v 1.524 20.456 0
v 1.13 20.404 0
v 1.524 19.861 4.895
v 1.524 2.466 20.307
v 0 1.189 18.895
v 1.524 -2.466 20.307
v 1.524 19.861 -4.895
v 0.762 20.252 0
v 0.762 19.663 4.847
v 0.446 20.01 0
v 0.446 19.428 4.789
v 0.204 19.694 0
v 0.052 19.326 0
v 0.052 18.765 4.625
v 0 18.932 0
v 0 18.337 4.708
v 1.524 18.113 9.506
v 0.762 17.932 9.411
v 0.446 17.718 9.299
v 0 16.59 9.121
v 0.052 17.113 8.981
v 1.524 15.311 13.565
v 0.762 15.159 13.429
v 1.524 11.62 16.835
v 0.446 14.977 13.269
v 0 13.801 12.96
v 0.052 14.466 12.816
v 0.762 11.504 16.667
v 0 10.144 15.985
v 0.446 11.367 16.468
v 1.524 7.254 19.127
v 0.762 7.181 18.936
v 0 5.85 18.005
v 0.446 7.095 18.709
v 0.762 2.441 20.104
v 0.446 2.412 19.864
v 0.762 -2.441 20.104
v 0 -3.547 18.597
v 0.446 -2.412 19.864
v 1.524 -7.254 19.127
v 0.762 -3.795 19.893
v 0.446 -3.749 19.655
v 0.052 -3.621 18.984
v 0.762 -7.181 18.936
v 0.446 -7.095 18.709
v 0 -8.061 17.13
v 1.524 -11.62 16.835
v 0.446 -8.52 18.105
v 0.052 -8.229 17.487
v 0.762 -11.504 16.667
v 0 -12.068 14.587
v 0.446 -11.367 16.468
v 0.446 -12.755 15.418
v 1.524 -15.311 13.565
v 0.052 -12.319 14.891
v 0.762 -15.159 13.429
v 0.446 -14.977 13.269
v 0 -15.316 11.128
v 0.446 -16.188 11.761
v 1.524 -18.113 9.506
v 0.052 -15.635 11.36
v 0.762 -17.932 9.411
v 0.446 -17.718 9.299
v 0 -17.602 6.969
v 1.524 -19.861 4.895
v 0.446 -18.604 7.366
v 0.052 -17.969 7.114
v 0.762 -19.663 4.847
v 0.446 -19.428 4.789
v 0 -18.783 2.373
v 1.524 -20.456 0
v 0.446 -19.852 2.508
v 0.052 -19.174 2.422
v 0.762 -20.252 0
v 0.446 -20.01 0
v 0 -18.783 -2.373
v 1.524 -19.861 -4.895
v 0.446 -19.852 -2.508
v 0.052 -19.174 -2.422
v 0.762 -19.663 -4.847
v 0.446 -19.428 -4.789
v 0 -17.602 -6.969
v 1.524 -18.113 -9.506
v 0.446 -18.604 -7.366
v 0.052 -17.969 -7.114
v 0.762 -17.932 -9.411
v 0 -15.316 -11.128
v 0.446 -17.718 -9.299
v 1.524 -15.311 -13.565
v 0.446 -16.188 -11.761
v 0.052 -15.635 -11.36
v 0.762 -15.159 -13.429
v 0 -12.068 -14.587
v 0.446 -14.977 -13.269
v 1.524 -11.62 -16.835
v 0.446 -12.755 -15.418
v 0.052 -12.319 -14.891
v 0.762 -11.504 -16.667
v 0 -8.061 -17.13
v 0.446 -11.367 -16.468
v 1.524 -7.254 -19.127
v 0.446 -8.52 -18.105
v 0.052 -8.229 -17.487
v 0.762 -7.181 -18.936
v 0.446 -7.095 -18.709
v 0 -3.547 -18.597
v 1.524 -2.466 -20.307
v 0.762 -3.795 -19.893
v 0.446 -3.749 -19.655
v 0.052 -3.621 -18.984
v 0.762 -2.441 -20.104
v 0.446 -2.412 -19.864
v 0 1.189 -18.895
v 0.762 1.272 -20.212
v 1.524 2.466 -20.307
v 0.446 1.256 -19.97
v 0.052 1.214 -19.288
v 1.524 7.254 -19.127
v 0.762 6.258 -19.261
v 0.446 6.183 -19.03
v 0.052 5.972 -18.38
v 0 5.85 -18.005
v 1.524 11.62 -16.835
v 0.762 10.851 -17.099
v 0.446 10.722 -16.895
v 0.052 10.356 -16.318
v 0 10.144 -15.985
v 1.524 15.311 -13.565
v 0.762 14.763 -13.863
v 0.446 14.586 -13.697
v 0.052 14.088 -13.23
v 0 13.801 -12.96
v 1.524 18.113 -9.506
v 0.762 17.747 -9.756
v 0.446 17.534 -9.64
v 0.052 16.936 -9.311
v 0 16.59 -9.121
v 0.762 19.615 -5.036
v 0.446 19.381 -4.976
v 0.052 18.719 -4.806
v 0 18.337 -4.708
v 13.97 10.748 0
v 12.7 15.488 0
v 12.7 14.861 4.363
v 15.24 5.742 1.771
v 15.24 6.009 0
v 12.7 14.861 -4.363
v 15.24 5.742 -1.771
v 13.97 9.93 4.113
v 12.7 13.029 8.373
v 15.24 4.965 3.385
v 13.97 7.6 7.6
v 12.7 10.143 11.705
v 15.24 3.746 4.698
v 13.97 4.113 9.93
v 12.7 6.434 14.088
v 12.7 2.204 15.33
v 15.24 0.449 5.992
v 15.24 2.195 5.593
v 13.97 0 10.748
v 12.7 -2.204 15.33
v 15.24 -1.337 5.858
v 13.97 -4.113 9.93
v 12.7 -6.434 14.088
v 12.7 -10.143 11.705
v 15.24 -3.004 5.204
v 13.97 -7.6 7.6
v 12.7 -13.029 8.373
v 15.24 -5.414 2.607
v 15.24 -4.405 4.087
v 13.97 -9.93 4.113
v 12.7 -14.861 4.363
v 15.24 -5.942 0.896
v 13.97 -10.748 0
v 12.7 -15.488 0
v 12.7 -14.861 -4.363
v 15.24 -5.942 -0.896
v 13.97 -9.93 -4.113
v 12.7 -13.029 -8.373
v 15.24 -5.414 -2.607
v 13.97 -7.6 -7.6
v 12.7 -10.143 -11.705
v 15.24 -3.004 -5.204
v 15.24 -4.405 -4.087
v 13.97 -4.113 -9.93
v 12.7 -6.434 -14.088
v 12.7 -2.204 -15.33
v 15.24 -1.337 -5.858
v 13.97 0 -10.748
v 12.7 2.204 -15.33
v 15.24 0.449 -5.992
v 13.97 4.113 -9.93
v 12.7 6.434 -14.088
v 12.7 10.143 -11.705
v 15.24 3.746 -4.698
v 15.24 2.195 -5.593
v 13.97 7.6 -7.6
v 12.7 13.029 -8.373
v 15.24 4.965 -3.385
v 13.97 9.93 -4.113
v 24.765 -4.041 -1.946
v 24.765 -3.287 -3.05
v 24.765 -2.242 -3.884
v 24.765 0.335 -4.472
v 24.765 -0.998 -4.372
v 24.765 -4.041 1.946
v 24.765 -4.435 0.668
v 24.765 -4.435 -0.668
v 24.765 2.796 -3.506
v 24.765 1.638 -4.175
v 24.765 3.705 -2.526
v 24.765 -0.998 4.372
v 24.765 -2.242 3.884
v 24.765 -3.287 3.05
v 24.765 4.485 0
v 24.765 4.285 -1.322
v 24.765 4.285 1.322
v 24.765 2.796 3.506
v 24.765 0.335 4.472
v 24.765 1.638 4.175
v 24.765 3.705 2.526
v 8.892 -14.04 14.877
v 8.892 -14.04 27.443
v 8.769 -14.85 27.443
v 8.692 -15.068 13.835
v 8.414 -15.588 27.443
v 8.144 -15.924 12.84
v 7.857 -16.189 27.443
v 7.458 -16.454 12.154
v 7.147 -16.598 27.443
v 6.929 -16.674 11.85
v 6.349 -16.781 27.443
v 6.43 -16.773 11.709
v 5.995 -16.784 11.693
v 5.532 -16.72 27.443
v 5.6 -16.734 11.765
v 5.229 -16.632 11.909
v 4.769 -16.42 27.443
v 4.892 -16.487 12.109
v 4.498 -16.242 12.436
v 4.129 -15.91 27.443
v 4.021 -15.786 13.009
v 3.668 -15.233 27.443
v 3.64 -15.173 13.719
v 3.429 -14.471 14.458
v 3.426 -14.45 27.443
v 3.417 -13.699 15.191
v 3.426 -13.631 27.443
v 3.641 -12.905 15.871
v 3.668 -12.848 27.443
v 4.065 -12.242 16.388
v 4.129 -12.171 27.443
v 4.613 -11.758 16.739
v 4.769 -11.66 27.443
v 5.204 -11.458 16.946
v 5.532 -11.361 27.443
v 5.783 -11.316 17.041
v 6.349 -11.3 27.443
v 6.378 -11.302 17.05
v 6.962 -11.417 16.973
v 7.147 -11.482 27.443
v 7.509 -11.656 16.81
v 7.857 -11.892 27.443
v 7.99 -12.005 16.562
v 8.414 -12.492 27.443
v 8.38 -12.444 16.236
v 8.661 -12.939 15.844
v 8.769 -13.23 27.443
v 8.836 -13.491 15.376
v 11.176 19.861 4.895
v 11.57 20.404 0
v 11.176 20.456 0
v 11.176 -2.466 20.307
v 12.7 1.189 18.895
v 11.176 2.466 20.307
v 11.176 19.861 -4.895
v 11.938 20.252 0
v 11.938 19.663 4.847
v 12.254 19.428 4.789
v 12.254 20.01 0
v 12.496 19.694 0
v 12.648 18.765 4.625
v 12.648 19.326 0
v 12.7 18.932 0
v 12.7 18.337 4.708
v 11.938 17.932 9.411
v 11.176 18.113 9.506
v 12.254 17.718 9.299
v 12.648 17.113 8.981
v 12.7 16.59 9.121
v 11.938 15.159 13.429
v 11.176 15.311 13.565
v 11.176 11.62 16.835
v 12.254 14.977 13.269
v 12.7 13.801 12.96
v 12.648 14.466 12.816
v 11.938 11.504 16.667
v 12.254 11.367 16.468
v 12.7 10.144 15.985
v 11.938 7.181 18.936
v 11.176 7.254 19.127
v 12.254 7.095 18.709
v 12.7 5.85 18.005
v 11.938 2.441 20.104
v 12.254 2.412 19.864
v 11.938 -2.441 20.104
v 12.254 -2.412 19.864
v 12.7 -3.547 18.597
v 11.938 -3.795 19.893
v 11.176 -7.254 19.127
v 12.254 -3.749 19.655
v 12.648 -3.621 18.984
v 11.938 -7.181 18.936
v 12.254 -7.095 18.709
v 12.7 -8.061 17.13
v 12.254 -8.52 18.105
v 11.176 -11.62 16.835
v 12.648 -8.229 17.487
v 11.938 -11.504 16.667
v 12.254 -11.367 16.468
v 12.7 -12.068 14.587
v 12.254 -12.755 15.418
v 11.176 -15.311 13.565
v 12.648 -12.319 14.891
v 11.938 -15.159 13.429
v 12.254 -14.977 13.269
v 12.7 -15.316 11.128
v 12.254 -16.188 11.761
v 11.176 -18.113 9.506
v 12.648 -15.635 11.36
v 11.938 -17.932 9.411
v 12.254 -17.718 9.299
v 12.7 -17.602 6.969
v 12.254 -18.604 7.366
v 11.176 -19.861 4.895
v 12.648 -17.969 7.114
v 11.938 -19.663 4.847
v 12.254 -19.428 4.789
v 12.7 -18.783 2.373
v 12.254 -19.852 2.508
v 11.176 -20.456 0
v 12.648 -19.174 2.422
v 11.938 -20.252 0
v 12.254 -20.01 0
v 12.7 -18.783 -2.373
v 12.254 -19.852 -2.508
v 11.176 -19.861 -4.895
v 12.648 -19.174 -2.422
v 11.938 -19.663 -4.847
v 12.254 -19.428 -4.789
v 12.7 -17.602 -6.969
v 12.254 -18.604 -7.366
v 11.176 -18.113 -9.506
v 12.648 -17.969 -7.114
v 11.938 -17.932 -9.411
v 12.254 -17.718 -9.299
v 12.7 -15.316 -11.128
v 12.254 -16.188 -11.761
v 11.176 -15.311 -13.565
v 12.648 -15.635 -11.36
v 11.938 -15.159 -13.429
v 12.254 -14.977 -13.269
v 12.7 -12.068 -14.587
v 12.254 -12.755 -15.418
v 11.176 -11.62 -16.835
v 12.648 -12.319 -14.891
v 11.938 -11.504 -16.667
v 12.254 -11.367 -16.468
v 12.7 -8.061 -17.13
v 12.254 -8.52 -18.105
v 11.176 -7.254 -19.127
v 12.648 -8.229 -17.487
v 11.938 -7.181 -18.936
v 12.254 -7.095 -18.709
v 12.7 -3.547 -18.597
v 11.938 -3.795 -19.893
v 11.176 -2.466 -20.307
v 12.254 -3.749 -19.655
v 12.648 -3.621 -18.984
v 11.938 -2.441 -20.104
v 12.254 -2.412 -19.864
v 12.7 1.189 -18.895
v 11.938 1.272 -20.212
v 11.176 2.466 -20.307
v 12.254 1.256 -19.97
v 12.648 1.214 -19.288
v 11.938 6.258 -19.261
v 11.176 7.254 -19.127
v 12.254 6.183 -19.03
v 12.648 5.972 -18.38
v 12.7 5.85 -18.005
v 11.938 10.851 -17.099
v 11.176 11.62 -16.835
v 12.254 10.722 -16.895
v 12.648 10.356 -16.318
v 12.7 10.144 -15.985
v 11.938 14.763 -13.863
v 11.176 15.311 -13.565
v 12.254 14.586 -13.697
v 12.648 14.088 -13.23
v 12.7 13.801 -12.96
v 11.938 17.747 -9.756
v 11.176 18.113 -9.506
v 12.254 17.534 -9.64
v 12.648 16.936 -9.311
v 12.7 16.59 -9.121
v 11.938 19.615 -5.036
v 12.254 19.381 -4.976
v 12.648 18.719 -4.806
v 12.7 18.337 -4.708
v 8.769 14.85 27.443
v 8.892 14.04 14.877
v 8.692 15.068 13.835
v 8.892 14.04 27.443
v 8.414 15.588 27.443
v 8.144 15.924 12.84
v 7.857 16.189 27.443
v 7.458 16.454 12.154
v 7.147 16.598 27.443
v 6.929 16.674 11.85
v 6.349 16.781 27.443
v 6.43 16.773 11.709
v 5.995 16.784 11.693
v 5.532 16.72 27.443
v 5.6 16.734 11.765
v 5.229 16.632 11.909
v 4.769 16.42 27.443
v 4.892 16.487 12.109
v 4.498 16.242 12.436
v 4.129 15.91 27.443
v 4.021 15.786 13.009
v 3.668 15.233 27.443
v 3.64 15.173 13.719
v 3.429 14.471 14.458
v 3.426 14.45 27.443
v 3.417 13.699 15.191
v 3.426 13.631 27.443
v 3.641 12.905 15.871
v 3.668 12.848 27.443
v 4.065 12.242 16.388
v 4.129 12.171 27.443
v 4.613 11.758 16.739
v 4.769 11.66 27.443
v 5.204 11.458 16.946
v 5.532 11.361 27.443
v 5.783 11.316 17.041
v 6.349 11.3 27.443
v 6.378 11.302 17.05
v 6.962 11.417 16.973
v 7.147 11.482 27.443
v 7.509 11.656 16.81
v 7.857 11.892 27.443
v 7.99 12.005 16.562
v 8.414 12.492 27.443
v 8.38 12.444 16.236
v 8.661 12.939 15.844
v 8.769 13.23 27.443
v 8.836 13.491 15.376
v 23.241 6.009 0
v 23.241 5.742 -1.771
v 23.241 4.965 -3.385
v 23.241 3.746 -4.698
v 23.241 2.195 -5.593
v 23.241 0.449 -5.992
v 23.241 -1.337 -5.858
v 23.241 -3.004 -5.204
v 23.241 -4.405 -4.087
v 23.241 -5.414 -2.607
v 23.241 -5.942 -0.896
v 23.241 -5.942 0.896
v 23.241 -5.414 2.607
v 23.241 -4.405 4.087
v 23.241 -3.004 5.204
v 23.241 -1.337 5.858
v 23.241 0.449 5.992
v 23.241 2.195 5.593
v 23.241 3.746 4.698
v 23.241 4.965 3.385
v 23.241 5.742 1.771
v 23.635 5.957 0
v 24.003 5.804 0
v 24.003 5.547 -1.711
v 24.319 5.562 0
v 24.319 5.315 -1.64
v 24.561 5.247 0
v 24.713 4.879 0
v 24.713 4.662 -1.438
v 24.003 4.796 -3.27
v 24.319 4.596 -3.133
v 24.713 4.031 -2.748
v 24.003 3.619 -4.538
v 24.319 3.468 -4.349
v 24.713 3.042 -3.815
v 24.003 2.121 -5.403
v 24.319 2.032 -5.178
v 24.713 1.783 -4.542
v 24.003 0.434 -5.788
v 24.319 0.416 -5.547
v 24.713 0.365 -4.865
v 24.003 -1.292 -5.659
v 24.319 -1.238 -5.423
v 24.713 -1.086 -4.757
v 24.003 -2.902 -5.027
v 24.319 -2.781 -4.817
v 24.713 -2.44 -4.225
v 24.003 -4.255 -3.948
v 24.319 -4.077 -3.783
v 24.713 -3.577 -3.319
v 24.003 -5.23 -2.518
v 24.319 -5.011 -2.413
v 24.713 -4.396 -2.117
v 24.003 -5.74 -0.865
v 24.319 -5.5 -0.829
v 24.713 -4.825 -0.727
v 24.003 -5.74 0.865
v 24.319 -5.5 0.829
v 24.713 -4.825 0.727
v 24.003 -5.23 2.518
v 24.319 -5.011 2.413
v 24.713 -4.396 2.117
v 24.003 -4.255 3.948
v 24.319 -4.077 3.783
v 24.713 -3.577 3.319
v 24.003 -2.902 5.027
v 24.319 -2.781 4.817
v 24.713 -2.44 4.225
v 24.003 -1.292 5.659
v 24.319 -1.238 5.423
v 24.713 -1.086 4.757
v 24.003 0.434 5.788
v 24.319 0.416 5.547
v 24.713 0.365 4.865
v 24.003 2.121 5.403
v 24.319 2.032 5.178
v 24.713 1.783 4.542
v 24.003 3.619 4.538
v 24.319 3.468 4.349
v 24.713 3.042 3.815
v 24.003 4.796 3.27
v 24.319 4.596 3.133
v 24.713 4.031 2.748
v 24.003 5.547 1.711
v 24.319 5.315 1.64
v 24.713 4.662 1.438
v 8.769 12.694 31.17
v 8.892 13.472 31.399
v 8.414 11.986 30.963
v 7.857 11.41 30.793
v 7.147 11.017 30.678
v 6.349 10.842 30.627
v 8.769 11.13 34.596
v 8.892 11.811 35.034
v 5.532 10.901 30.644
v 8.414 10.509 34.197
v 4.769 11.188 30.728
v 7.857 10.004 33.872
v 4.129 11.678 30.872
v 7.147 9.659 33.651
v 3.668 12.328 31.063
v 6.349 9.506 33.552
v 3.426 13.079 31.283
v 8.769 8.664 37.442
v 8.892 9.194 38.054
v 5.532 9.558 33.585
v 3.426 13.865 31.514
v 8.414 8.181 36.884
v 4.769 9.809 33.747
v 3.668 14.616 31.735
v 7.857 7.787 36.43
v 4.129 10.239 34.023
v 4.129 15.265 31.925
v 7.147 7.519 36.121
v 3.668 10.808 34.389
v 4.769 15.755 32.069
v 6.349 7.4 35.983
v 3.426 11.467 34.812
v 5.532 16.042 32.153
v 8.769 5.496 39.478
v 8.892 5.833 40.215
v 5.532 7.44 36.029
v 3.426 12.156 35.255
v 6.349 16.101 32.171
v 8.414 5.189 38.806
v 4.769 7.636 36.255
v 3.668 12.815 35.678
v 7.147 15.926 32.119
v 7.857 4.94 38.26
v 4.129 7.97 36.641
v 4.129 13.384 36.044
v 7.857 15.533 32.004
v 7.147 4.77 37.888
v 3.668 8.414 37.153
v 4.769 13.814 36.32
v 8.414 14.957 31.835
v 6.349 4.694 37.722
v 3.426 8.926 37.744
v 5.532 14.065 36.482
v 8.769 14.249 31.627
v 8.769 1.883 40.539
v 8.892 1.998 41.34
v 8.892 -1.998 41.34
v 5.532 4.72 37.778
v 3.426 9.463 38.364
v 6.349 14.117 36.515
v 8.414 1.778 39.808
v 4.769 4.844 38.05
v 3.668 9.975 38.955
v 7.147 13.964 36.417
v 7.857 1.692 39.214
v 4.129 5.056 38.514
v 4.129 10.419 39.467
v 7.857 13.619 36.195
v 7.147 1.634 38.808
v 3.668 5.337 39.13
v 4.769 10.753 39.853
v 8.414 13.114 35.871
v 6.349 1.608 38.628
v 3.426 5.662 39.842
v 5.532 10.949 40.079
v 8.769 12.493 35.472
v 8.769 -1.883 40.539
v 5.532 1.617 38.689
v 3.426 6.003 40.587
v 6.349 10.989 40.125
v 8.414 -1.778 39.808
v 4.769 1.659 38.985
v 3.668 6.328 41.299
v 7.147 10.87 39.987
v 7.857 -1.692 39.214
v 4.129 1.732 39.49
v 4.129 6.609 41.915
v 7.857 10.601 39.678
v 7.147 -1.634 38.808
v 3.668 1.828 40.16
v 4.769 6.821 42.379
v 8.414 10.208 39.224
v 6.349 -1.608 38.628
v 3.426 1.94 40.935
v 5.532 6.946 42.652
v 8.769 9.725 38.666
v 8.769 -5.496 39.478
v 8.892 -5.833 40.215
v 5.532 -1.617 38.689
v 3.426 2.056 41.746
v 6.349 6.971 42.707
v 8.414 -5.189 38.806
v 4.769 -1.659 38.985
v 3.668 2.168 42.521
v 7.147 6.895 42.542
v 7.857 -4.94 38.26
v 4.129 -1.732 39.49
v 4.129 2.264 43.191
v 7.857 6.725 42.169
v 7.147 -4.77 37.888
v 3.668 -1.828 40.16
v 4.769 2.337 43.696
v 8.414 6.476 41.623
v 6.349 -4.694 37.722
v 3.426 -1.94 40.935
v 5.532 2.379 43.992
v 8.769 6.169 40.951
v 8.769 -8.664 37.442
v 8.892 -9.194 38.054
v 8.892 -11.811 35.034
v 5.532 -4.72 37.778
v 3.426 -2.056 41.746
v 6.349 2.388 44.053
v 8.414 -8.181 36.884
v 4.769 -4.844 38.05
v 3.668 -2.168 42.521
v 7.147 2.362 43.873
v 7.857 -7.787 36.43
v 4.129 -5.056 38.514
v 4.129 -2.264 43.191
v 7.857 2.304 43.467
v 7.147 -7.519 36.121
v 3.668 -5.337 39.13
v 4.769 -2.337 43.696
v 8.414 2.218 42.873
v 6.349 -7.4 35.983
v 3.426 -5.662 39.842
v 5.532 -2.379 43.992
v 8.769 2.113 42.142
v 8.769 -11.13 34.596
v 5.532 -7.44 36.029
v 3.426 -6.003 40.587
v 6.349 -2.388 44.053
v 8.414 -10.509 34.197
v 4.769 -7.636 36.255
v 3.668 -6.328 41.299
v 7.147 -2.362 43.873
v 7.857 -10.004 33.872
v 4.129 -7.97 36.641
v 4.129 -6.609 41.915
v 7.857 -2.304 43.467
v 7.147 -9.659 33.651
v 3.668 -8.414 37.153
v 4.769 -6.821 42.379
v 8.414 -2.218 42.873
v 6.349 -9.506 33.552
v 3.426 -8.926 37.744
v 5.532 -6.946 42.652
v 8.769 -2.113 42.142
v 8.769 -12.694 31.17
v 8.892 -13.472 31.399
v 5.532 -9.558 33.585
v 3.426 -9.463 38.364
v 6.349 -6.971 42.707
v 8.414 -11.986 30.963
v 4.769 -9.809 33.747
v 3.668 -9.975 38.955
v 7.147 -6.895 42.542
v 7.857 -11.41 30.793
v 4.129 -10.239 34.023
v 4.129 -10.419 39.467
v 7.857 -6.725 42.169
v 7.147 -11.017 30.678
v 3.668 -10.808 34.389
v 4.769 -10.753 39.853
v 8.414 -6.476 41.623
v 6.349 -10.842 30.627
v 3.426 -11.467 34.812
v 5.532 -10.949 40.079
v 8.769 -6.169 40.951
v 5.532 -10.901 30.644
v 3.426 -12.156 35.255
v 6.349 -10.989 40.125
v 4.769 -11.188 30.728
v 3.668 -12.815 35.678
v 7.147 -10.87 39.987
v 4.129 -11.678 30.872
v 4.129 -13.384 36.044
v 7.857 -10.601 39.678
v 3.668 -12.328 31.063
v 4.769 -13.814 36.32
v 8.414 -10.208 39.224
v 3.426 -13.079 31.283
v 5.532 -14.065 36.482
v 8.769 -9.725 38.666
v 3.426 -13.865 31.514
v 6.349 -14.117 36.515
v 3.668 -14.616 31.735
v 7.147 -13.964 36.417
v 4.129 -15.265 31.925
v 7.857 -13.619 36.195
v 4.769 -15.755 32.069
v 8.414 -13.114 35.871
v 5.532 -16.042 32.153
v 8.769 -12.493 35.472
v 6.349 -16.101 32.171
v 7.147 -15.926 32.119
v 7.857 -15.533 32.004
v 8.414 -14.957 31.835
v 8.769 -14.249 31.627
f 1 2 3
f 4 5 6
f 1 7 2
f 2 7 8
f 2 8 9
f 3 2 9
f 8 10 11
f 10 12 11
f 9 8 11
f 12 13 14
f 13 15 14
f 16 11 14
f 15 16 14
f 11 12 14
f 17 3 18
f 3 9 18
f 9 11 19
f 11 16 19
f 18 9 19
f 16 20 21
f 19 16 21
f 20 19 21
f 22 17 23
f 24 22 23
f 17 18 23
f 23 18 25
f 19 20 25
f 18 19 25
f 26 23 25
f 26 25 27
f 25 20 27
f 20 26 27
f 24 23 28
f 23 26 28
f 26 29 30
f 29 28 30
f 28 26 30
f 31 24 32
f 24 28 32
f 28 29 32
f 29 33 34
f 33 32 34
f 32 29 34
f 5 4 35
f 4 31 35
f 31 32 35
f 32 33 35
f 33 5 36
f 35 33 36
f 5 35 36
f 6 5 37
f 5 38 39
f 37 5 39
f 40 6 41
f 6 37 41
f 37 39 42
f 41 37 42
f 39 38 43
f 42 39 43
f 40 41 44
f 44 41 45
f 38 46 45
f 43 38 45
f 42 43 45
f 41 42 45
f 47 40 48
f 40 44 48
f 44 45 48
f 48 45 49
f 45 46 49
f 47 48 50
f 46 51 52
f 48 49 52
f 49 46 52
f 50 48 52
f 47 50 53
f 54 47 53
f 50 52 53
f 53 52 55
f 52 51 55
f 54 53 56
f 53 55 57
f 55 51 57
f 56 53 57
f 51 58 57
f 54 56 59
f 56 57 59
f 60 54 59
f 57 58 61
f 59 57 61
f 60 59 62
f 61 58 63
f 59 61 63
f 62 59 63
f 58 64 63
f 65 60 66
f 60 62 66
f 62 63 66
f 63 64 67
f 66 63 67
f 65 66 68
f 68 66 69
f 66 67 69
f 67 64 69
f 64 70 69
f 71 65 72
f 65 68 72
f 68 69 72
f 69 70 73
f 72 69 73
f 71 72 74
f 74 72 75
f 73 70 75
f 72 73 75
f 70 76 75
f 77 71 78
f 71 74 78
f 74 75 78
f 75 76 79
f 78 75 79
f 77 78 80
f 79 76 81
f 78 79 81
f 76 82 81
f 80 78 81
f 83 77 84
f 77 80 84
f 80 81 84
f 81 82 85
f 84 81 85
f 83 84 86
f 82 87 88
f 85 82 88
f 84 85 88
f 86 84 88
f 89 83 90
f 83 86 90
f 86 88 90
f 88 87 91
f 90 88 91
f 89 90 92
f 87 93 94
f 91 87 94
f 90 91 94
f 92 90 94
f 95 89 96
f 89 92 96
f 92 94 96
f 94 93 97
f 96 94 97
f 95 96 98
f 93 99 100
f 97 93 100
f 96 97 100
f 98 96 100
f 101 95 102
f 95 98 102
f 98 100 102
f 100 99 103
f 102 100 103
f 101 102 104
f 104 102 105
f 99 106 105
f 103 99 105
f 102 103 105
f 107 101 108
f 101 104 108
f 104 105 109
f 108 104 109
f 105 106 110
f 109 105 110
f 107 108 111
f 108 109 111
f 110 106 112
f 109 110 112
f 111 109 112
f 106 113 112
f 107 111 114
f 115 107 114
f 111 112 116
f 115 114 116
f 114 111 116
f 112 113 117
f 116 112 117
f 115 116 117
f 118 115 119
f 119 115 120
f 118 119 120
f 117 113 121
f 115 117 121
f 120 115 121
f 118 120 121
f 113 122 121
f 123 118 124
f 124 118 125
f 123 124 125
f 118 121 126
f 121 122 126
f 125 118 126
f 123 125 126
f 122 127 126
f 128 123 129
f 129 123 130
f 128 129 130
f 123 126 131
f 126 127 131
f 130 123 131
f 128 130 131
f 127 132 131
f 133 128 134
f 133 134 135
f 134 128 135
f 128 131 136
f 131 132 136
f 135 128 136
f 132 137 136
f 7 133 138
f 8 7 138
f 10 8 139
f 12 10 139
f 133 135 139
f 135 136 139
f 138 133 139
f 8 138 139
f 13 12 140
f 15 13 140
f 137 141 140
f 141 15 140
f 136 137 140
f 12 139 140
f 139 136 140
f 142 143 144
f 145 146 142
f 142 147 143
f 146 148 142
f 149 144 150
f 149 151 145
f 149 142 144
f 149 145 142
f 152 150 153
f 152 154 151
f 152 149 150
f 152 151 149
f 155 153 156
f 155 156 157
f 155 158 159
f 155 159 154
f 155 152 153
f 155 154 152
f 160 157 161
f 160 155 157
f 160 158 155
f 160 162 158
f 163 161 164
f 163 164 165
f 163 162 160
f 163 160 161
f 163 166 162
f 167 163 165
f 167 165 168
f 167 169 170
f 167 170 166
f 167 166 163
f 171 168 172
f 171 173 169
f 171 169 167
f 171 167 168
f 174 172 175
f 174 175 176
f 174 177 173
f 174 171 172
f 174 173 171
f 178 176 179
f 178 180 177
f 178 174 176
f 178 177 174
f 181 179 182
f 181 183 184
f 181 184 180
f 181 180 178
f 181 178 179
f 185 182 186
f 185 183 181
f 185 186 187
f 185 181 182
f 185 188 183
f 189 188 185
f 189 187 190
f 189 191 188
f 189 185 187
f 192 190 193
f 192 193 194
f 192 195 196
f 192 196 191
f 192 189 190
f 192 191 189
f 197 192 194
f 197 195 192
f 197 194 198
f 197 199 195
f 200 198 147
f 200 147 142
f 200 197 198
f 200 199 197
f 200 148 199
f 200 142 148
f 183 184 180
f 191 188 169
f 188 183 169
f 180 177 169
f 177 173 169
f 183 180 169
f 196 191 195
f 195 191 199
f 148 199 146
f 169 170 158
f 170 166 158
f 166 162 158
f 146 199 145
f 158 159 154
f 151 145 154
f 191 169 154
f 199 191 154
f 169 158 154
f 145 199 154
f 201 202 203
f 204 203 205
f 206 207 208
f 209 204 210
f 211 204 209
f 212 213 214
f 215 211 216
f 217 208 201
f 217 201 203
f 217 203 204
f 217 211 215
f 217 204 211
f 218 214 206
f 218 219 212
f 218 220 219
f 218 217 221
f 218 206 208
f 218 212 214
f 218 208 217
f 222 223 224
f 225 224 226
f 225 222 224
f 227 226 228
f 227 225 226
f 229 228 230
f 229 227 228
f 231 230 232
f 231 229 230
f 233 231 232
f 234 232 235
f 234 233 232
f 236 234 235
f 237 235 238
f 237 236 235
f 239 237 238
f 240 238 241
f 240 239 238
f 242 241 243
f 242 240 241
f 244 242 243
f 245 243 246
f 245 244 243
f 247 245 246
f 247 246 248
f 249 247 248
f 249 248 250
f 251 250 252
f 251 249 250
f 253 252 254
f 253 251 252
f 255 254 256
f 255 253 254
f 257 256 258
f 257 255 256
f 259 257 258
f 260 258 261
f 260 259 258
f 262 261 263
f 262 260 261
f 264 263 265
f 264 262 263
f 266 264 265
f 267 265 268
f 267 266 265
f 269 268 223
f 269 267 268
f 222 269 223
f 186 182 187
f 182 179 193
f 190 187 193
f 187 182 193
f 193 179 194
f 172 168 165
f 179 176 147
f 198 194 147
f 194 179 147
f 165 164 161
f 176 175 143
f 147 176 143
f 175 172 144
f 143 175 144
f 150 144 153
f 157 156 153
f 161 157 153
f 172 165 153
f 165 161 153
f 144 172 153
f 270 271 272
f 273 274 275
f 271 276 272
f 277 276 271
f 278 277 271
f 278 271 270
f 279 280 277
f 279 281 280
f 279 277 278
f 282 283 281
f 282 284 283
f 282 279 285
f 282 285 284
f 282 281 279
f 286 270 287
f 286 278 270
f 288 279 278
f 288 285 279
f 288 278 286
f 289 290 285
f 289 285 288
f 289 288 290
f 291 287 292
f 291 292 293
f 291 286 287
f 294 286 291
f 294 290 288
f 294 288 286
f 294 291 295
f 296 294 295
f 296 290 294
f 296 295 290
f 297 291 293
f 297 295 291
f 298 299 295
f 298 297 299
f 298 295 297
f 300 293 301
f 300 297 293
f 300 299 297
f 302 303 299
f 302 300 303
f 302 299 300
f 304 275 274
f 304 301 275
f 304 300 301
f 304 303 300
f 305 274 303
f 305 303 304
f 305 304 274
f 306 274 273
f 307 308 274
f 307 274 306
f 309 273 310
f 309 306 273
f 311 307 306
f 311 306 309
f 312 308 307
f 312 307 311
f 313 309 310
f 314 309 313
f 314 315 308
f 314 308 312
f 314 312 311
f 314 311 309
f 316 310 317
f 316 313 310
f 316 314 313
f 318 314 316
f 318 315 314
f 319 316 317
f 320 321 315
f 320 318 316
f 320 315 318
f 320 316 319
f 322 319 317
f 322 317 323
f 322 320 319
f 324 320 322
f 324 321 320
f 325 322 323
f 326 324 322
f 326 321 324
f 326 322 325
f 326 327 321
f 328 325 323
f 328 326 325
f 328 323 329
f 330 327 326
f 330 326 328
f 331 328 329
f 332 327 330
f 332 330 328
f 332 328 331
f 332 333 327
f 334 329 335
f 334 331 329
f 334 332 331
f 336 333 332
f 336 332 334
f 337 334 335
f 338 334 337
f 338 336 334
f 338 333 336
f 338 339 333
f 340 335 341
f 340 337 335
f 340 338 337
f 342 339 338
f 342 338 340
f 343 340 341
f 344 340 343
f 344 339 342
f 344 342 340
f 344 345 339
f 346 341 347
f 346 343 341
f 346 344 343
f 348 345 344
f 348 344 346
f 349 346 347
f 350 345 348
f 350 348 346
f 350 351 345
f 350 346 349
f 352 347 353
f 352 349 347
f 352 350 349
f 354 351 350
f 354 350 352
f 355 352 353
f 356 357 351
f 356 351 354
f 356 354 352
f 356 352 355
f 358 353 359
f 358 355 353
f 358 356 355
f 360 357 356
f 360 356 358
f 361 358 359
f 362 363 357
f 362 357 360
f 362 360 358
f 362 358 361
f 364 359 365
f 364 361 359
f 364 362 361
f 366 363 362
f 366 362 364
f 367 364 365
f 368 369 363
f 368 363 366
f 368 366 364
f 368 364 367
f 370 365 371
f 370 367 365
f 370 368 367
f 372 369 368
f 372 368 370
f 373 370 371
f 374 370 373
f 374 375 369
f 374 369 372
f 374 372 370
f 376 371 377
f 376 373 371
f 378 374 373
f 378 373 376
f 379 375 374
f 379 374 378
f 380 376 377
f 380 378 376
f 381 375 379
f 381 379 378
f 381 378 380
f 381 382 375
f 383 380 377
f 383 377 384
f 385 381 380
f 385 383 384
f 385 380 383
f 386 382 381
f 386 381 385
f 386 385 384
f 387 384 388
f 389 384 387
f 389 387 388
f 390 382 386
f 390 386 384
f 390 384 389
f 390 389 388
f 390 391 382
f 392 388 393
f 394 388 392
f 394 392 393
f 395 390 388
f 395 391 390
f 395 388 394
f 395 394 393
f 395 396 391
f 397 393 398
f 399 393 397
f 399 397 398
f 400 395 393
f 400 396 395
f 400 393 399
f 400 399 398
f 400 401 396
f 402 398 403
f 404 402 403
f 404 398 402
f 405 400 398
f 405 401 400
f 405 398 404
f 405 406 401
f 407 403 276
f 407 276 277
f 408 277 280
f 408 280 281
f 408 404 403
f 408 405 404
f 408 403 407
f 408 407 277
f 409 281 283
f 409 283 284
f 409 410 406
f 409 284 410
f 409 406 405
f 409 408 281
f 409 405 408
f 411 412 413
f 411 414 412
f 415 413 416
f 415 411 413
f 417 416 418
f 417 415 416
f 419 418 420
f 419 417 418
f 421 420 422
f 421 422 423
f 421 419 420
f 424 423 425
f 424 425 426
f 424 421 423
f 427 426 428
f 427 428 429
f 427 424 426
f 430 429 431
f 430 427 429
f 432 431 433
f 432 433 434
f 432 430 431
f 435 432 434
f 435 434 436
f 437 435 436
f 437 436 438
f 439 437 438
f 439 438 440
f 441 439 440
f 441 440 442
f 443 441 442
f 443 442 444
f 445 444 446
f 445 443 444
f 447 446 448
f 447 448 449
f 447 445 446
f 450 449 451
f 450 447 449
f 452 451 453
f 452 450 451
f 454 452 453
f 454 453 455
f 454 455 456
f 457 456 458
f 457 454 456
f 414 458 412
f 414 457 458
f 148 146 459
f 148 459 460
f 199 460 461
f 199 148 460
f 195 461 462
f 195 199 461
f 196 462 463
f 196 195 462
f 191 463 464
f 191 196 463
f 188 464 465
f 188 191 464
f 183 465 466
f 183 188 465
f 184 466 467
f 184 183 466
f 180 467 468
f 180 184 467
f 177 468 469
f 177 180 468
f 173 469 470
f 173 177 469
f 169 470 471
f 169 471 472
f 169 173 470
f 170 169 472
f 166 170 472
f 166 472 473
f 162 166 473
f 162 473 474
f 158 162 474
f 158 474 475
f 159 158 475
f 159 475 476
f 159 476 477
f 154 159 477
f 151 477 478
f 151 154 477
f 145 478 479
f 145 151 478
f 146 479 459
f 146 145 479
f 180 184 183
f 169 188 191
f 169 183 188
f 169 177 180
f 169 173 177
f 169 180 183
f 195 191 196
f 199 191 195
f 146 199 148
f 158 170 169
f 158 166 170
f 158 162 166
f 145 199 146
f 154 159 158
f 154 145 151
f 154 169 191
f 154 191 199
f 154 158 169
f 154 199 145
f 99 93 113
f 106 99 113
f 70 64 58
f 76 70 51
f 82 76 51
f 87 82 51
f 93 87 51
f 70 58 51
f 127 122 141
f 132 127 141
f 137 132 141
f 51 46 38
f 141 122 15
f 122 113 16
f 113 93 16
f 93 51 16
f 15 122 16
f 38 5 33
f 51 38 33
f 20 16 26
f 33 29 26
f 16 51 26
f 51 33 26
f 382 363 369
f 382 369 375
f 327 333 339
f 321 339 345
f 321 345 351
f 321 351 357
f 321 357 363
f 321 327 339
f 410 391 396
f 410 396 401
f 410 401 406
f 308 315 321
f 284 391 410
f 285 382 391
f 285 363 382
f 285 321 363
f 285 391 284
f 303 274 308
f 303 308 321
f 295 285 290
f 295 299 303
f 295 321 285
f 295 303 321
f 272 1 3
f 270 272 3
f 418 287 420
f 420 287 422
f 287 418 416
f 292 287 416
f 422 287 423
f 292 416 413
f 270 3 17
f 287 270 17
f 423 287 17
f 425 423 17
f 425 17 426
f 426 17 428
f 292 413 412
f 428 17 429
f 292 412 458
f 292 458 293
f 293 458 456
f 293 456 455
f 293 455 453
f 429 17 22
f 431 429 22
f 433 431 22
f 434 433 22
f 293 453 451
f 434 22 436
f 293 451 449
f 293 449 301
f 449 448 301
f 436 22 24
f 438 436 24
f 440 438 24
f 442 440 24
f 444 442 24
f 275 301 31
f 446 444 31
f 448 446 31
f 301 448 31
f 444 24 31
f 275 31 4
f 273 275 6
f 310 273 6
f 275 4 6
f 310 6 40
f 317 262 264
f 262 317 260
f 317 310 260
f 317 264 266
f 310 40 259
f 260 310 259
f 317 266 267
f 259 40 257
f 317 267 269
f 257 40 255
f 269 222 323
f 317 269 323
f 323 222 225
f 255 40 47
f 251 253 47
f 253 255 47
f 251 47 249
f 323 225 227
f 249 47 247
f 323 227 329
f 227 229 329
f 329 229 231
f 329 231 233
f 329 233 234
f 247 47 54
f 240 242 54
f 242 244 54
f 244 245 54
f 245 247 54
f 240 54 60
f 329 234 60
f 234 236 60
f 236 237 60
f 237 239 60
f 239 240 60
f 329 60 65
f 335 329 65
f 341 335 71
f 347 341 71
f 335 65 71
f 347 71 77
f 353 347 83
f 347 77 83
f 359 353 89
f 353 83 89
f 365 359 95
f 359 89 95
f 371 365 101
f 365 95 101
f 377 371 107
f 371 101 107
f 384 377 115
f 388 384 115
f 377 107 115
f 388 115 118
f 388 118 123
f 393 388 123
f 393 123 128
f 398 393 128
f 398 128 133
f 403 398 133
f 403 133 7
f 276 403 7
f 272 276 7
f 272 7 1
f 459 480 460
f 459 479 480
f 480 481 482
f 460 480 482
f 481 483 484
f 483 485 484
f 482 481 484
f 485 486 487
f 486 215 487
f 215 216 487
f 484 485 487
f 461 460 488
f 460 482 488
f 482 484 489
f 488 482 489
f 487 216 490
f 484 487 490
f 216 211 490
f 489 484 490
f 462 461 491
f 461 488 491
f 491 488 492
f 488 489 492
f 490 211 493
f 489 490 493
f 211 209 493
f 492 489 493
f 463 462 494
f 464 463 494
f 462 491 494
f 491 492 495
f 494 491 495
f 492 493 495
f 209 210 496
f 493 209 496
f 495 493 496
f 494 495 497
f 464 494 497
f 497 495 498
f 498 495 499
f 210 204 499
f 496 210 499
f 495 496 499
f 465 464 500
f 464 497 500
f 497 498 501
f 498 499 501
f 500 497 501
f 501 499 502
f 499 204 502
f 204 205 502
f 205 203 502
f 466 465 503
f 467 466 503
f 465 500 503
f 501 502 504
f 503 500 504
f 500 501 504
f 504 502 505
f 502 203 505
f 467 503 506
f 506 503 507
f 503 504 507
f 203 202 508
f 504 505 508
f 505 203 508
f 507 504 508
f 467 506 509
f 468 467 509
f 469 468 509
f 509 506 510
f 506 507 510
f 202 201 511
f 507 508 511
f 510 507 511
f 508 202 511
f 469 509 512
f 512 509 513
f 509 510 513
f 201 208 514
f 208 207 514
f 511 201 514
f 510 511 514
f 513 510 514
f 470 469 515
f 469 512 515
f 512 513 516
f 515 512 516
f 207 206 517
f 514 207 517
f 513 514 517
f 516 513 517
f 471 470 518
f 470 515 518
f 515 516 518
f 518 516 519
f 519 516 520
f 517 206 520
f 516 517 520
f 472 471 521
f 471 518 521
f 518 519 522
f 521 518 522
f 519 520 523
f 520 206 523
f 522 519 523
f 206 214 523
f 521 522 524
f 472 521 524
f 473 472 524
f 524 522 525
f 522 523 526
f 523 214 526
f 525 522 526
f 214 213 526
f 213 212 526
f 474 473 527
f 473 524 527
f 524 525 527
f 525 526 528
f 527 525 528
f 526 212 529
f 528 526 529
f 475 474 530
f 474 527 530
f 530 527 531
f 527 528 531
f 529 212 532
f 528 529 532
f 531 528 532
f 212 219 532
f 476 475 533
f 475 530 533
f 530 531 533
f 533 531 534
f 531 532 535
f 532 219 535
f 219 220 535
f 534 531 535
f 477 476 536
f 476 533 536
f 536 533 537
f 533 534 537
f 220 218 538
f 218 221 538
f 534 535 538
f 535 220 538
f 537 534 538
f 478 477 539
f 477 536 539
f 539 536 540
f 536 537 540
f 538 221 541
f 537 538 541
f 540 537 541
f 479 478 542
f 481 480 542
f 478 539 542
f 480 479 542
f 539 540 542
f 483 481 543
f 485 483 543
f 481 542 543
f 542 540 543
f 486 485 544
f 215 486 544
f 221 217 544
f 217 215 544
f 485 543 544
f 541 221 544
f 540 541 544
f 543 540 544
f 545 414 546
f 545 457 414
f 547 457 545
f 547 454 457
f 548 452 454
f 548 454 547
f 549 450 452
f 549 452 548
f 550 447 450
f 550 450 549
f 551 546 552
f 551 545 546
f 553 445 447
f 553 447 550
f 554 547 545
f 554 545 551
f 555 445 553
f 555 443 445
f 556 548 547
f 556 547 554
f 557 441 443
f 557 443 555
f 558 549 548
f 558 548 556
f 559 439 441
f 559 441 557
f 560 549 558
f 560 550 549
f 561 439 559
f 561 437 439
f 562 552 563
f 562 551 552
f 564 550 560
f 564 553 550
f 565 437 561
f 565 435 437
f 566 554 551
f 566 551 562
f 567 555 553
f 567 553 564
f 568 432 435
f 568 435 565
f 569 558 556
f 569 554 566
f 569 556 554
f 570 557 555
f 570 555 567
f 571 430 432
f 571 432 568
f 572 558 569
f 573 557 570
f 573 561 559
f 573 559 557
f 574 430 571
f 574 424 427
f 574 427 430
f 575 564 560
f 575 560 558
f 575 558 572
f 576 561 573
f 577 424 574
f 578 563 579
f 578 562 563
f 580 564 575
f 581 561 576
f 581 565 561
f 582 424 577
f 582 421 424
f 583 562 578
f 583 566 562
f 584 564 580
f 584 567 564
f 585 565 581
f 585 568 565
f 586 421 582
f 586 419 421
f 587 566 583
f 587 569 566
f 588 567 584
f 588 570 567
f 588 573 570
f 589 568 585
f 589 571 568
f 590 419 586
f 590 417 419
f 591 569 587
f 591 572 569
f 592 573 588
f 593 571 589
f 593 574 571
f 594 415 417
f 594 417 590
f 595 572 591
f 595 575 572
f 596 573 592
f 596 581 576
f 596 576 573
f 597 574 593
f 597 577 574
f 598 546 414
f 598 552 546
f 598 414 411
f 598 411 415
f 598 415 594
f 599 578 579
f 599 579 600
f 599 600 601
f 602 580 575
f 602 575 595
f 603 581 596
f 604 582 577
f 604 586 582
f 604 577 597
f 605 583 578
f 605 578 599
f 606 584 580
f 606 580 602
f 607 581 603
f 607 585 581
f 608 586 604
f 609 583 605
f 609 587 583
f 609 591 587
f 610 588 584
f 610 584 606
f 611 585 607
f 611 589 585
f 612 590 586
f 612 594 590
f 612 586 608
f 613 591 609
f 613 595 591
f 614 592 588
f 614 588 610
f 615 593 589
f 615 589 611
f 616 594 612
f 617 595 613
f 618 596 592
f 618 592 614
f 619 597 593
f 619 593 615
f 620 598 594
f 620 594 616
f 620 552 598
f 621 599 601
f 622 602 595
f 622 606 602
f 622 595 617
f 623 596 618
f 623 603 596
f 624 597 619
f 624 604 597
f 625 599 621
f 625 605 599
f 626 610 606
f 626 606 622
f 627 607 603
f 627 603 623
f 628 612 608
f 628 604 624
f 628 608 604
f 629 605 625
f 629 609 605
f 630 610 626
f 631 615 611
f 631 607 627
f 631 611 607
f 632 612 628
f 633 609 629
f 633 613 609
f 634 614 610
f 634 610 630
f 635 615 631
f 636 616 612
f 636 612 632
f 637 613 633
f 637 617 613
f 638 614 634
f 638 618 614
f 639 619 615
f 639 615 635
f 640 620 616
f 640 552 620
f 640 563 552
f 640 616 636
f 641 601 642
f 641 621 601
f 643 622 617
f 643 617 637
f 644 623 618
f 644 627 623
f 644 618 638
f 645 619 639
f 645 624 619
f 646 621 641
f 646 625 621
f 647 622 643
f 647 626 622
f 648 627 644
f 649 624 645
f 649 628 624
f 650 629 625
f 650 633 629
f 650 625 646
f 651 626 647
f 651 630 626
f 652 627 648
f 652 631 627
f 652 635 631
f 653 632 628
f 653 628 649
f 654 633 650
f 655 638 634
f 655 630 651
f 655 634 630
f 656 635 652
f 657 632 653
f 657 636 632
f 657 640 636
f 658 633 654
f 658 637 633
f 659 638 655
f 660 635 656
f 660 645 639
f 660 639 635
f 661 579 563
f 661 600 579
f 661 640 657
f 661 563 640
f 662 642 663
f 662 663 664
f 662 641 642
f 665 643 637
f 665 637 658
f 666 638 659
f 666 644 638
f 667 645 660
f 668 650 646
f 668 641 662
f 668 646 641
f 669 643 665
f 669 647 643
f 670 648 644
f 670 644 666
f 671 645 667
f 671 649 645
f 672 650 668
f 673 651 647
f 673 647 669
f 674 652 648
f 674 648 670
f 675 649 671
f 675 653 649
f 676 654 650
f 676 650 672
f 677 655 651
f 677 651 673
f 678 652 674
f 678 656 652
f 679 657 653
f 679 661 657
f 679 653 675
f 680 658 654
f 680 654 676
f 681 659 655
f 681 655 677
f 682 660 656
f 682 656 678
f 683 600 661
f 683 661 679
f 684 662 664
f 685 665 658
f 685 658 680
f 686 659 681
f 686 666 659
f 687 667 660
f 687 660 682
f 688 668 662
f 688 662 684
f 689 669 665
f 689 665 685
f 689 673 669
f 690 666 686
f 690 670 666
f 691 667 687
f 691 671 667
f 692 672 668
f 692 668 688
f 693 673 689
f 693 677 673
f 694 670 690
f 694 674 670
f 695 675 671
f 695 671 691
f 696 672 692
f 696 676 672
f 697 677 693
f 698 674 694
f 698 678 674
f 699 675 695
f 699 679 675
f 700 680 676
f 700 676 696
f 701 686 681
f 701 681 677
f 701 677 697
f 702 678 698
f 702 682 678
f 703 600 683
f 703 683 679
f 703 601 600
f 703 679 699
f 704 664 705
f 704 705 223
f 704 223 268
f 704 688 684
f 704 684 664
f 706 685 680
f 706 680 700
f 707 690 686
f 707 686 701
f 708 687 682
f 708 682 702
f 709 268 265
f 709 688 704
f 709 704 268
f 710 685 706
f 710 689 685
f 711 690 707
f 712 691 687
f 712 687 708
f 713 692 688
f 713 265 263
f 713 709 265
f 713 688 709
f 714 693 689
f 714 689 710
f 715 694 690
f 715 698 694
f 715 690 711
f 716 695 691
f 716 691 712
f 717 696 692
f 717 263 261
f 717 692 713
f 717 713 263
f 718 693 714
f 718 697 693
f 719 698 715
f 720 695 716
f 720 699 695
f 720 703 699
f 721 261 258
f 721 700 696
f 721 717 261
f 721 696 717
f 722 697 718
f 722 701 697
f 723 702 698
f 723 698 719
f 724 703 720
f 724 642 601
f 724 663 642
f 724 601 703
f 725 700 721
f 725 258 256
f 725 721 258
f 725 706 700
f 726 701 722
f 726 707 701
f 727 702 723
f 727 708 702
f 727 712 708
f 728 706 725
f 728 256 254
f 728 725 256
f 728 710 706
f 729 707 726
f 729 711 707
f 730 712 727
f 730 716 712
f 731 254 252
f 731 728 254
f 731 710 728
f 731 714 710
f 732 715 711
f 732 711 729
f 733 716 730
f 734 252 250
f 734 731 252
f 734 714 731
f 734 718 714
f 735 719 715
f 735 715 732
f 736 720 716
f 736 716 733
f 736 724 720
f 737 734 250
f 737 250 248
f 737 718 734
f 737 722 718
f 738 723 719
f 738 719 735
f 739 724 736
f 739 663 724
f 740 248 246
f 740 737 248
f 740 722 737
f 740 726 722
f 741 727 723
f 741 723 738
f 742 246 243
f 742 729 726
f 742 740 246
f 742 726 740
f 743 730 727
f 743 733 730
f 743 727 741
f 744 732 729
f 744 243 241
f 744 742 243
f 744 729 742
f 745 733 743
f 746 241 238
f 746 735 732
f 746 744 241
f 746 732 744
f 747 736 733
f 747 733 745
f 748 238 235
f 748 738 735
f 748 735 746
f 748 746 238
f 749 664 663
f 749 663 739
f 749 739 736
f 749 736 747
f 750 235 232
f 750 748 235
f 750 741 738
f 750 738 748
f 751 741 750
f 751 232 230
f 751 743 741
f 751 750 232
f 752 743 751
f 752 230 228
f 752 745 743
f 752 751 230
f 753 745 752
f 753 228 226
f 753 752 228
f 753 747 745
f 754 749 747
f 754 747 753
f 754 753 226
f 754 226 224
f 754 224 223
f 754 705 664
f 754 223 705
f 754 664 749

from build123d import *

# Parameters (mm, degrees)
F0_R     = 20.4558961716
F1_DEPTH = 12.7
F3_R     = 2.7480657839
F7_R     = 15.4880716028
F8_DEPTH = 2.54
F8_TAPER = 75
F9_DEPTH = 9.525
F10_R    = 1.524
F11_R    = 1.524


with BuildPart() as f1:
    # F0 (on Right) → F1 (new body)
    with BuildSketch(Plane.YZ):
        Circle(F0_R)
    extrude(amount=F1_DEPTH)

    # F6: sweep along a path in F5
    with BuildLine(Plane.YZ.offset(6.35)) as f6_path:
        Line((14.0403462574, 0), (14.0403462574, 27.4430233985))
        ThreePointArc((14.0403462574, 27.4430233985), (0, 41.4833696559), (-14.0403462574, 27.4430233985))
        Line((-14.0403462574, 27.4430233985), (-14.0403462574, 0))
    # F3 (on Top) → F6 (sweep)
    with BuildSketch(Plane.XY):
        with Locations((6.1434661038, 14.0403462574)):
            Circle(F3_R)
    sweep(path=f6_path.line)

    # F11
    f11_edges = [f1.edges().sort_by_distance(p)[0] for p in [
        (0, -20.455896, 0),
        (12.7, -20.455896, 0),
    ]]
    fillet(f11_edges, radius=F11_R)


with BuildPart() as f8:
    # F7 (on face) → F8 (new body)
    with BuildSketch(Plane.YZ.offset(12.7)):
        Circle(F7_R)
    extrude(amount=F8_DEPTH, taper=F8_TAPER)


with BuildPart() as f9:
    # F9 (new): a face of the model
    f9_faces = [f8.part.faces().sort_by_distance(p)[0] for p in [
        (15.24, 0, 0),
    ]]
    extrude(f9_faces, amount=F9_DEPTH)

    # F10
    f10_edges = [f9.edges().sort_by_distance(p)[0] for p in [
        (24.765, -6.008663, 0),
    ]]
    fillet(f10_edges, radius=F10_R)


solid = Compound([f1.part, f8.part, f9.part])
